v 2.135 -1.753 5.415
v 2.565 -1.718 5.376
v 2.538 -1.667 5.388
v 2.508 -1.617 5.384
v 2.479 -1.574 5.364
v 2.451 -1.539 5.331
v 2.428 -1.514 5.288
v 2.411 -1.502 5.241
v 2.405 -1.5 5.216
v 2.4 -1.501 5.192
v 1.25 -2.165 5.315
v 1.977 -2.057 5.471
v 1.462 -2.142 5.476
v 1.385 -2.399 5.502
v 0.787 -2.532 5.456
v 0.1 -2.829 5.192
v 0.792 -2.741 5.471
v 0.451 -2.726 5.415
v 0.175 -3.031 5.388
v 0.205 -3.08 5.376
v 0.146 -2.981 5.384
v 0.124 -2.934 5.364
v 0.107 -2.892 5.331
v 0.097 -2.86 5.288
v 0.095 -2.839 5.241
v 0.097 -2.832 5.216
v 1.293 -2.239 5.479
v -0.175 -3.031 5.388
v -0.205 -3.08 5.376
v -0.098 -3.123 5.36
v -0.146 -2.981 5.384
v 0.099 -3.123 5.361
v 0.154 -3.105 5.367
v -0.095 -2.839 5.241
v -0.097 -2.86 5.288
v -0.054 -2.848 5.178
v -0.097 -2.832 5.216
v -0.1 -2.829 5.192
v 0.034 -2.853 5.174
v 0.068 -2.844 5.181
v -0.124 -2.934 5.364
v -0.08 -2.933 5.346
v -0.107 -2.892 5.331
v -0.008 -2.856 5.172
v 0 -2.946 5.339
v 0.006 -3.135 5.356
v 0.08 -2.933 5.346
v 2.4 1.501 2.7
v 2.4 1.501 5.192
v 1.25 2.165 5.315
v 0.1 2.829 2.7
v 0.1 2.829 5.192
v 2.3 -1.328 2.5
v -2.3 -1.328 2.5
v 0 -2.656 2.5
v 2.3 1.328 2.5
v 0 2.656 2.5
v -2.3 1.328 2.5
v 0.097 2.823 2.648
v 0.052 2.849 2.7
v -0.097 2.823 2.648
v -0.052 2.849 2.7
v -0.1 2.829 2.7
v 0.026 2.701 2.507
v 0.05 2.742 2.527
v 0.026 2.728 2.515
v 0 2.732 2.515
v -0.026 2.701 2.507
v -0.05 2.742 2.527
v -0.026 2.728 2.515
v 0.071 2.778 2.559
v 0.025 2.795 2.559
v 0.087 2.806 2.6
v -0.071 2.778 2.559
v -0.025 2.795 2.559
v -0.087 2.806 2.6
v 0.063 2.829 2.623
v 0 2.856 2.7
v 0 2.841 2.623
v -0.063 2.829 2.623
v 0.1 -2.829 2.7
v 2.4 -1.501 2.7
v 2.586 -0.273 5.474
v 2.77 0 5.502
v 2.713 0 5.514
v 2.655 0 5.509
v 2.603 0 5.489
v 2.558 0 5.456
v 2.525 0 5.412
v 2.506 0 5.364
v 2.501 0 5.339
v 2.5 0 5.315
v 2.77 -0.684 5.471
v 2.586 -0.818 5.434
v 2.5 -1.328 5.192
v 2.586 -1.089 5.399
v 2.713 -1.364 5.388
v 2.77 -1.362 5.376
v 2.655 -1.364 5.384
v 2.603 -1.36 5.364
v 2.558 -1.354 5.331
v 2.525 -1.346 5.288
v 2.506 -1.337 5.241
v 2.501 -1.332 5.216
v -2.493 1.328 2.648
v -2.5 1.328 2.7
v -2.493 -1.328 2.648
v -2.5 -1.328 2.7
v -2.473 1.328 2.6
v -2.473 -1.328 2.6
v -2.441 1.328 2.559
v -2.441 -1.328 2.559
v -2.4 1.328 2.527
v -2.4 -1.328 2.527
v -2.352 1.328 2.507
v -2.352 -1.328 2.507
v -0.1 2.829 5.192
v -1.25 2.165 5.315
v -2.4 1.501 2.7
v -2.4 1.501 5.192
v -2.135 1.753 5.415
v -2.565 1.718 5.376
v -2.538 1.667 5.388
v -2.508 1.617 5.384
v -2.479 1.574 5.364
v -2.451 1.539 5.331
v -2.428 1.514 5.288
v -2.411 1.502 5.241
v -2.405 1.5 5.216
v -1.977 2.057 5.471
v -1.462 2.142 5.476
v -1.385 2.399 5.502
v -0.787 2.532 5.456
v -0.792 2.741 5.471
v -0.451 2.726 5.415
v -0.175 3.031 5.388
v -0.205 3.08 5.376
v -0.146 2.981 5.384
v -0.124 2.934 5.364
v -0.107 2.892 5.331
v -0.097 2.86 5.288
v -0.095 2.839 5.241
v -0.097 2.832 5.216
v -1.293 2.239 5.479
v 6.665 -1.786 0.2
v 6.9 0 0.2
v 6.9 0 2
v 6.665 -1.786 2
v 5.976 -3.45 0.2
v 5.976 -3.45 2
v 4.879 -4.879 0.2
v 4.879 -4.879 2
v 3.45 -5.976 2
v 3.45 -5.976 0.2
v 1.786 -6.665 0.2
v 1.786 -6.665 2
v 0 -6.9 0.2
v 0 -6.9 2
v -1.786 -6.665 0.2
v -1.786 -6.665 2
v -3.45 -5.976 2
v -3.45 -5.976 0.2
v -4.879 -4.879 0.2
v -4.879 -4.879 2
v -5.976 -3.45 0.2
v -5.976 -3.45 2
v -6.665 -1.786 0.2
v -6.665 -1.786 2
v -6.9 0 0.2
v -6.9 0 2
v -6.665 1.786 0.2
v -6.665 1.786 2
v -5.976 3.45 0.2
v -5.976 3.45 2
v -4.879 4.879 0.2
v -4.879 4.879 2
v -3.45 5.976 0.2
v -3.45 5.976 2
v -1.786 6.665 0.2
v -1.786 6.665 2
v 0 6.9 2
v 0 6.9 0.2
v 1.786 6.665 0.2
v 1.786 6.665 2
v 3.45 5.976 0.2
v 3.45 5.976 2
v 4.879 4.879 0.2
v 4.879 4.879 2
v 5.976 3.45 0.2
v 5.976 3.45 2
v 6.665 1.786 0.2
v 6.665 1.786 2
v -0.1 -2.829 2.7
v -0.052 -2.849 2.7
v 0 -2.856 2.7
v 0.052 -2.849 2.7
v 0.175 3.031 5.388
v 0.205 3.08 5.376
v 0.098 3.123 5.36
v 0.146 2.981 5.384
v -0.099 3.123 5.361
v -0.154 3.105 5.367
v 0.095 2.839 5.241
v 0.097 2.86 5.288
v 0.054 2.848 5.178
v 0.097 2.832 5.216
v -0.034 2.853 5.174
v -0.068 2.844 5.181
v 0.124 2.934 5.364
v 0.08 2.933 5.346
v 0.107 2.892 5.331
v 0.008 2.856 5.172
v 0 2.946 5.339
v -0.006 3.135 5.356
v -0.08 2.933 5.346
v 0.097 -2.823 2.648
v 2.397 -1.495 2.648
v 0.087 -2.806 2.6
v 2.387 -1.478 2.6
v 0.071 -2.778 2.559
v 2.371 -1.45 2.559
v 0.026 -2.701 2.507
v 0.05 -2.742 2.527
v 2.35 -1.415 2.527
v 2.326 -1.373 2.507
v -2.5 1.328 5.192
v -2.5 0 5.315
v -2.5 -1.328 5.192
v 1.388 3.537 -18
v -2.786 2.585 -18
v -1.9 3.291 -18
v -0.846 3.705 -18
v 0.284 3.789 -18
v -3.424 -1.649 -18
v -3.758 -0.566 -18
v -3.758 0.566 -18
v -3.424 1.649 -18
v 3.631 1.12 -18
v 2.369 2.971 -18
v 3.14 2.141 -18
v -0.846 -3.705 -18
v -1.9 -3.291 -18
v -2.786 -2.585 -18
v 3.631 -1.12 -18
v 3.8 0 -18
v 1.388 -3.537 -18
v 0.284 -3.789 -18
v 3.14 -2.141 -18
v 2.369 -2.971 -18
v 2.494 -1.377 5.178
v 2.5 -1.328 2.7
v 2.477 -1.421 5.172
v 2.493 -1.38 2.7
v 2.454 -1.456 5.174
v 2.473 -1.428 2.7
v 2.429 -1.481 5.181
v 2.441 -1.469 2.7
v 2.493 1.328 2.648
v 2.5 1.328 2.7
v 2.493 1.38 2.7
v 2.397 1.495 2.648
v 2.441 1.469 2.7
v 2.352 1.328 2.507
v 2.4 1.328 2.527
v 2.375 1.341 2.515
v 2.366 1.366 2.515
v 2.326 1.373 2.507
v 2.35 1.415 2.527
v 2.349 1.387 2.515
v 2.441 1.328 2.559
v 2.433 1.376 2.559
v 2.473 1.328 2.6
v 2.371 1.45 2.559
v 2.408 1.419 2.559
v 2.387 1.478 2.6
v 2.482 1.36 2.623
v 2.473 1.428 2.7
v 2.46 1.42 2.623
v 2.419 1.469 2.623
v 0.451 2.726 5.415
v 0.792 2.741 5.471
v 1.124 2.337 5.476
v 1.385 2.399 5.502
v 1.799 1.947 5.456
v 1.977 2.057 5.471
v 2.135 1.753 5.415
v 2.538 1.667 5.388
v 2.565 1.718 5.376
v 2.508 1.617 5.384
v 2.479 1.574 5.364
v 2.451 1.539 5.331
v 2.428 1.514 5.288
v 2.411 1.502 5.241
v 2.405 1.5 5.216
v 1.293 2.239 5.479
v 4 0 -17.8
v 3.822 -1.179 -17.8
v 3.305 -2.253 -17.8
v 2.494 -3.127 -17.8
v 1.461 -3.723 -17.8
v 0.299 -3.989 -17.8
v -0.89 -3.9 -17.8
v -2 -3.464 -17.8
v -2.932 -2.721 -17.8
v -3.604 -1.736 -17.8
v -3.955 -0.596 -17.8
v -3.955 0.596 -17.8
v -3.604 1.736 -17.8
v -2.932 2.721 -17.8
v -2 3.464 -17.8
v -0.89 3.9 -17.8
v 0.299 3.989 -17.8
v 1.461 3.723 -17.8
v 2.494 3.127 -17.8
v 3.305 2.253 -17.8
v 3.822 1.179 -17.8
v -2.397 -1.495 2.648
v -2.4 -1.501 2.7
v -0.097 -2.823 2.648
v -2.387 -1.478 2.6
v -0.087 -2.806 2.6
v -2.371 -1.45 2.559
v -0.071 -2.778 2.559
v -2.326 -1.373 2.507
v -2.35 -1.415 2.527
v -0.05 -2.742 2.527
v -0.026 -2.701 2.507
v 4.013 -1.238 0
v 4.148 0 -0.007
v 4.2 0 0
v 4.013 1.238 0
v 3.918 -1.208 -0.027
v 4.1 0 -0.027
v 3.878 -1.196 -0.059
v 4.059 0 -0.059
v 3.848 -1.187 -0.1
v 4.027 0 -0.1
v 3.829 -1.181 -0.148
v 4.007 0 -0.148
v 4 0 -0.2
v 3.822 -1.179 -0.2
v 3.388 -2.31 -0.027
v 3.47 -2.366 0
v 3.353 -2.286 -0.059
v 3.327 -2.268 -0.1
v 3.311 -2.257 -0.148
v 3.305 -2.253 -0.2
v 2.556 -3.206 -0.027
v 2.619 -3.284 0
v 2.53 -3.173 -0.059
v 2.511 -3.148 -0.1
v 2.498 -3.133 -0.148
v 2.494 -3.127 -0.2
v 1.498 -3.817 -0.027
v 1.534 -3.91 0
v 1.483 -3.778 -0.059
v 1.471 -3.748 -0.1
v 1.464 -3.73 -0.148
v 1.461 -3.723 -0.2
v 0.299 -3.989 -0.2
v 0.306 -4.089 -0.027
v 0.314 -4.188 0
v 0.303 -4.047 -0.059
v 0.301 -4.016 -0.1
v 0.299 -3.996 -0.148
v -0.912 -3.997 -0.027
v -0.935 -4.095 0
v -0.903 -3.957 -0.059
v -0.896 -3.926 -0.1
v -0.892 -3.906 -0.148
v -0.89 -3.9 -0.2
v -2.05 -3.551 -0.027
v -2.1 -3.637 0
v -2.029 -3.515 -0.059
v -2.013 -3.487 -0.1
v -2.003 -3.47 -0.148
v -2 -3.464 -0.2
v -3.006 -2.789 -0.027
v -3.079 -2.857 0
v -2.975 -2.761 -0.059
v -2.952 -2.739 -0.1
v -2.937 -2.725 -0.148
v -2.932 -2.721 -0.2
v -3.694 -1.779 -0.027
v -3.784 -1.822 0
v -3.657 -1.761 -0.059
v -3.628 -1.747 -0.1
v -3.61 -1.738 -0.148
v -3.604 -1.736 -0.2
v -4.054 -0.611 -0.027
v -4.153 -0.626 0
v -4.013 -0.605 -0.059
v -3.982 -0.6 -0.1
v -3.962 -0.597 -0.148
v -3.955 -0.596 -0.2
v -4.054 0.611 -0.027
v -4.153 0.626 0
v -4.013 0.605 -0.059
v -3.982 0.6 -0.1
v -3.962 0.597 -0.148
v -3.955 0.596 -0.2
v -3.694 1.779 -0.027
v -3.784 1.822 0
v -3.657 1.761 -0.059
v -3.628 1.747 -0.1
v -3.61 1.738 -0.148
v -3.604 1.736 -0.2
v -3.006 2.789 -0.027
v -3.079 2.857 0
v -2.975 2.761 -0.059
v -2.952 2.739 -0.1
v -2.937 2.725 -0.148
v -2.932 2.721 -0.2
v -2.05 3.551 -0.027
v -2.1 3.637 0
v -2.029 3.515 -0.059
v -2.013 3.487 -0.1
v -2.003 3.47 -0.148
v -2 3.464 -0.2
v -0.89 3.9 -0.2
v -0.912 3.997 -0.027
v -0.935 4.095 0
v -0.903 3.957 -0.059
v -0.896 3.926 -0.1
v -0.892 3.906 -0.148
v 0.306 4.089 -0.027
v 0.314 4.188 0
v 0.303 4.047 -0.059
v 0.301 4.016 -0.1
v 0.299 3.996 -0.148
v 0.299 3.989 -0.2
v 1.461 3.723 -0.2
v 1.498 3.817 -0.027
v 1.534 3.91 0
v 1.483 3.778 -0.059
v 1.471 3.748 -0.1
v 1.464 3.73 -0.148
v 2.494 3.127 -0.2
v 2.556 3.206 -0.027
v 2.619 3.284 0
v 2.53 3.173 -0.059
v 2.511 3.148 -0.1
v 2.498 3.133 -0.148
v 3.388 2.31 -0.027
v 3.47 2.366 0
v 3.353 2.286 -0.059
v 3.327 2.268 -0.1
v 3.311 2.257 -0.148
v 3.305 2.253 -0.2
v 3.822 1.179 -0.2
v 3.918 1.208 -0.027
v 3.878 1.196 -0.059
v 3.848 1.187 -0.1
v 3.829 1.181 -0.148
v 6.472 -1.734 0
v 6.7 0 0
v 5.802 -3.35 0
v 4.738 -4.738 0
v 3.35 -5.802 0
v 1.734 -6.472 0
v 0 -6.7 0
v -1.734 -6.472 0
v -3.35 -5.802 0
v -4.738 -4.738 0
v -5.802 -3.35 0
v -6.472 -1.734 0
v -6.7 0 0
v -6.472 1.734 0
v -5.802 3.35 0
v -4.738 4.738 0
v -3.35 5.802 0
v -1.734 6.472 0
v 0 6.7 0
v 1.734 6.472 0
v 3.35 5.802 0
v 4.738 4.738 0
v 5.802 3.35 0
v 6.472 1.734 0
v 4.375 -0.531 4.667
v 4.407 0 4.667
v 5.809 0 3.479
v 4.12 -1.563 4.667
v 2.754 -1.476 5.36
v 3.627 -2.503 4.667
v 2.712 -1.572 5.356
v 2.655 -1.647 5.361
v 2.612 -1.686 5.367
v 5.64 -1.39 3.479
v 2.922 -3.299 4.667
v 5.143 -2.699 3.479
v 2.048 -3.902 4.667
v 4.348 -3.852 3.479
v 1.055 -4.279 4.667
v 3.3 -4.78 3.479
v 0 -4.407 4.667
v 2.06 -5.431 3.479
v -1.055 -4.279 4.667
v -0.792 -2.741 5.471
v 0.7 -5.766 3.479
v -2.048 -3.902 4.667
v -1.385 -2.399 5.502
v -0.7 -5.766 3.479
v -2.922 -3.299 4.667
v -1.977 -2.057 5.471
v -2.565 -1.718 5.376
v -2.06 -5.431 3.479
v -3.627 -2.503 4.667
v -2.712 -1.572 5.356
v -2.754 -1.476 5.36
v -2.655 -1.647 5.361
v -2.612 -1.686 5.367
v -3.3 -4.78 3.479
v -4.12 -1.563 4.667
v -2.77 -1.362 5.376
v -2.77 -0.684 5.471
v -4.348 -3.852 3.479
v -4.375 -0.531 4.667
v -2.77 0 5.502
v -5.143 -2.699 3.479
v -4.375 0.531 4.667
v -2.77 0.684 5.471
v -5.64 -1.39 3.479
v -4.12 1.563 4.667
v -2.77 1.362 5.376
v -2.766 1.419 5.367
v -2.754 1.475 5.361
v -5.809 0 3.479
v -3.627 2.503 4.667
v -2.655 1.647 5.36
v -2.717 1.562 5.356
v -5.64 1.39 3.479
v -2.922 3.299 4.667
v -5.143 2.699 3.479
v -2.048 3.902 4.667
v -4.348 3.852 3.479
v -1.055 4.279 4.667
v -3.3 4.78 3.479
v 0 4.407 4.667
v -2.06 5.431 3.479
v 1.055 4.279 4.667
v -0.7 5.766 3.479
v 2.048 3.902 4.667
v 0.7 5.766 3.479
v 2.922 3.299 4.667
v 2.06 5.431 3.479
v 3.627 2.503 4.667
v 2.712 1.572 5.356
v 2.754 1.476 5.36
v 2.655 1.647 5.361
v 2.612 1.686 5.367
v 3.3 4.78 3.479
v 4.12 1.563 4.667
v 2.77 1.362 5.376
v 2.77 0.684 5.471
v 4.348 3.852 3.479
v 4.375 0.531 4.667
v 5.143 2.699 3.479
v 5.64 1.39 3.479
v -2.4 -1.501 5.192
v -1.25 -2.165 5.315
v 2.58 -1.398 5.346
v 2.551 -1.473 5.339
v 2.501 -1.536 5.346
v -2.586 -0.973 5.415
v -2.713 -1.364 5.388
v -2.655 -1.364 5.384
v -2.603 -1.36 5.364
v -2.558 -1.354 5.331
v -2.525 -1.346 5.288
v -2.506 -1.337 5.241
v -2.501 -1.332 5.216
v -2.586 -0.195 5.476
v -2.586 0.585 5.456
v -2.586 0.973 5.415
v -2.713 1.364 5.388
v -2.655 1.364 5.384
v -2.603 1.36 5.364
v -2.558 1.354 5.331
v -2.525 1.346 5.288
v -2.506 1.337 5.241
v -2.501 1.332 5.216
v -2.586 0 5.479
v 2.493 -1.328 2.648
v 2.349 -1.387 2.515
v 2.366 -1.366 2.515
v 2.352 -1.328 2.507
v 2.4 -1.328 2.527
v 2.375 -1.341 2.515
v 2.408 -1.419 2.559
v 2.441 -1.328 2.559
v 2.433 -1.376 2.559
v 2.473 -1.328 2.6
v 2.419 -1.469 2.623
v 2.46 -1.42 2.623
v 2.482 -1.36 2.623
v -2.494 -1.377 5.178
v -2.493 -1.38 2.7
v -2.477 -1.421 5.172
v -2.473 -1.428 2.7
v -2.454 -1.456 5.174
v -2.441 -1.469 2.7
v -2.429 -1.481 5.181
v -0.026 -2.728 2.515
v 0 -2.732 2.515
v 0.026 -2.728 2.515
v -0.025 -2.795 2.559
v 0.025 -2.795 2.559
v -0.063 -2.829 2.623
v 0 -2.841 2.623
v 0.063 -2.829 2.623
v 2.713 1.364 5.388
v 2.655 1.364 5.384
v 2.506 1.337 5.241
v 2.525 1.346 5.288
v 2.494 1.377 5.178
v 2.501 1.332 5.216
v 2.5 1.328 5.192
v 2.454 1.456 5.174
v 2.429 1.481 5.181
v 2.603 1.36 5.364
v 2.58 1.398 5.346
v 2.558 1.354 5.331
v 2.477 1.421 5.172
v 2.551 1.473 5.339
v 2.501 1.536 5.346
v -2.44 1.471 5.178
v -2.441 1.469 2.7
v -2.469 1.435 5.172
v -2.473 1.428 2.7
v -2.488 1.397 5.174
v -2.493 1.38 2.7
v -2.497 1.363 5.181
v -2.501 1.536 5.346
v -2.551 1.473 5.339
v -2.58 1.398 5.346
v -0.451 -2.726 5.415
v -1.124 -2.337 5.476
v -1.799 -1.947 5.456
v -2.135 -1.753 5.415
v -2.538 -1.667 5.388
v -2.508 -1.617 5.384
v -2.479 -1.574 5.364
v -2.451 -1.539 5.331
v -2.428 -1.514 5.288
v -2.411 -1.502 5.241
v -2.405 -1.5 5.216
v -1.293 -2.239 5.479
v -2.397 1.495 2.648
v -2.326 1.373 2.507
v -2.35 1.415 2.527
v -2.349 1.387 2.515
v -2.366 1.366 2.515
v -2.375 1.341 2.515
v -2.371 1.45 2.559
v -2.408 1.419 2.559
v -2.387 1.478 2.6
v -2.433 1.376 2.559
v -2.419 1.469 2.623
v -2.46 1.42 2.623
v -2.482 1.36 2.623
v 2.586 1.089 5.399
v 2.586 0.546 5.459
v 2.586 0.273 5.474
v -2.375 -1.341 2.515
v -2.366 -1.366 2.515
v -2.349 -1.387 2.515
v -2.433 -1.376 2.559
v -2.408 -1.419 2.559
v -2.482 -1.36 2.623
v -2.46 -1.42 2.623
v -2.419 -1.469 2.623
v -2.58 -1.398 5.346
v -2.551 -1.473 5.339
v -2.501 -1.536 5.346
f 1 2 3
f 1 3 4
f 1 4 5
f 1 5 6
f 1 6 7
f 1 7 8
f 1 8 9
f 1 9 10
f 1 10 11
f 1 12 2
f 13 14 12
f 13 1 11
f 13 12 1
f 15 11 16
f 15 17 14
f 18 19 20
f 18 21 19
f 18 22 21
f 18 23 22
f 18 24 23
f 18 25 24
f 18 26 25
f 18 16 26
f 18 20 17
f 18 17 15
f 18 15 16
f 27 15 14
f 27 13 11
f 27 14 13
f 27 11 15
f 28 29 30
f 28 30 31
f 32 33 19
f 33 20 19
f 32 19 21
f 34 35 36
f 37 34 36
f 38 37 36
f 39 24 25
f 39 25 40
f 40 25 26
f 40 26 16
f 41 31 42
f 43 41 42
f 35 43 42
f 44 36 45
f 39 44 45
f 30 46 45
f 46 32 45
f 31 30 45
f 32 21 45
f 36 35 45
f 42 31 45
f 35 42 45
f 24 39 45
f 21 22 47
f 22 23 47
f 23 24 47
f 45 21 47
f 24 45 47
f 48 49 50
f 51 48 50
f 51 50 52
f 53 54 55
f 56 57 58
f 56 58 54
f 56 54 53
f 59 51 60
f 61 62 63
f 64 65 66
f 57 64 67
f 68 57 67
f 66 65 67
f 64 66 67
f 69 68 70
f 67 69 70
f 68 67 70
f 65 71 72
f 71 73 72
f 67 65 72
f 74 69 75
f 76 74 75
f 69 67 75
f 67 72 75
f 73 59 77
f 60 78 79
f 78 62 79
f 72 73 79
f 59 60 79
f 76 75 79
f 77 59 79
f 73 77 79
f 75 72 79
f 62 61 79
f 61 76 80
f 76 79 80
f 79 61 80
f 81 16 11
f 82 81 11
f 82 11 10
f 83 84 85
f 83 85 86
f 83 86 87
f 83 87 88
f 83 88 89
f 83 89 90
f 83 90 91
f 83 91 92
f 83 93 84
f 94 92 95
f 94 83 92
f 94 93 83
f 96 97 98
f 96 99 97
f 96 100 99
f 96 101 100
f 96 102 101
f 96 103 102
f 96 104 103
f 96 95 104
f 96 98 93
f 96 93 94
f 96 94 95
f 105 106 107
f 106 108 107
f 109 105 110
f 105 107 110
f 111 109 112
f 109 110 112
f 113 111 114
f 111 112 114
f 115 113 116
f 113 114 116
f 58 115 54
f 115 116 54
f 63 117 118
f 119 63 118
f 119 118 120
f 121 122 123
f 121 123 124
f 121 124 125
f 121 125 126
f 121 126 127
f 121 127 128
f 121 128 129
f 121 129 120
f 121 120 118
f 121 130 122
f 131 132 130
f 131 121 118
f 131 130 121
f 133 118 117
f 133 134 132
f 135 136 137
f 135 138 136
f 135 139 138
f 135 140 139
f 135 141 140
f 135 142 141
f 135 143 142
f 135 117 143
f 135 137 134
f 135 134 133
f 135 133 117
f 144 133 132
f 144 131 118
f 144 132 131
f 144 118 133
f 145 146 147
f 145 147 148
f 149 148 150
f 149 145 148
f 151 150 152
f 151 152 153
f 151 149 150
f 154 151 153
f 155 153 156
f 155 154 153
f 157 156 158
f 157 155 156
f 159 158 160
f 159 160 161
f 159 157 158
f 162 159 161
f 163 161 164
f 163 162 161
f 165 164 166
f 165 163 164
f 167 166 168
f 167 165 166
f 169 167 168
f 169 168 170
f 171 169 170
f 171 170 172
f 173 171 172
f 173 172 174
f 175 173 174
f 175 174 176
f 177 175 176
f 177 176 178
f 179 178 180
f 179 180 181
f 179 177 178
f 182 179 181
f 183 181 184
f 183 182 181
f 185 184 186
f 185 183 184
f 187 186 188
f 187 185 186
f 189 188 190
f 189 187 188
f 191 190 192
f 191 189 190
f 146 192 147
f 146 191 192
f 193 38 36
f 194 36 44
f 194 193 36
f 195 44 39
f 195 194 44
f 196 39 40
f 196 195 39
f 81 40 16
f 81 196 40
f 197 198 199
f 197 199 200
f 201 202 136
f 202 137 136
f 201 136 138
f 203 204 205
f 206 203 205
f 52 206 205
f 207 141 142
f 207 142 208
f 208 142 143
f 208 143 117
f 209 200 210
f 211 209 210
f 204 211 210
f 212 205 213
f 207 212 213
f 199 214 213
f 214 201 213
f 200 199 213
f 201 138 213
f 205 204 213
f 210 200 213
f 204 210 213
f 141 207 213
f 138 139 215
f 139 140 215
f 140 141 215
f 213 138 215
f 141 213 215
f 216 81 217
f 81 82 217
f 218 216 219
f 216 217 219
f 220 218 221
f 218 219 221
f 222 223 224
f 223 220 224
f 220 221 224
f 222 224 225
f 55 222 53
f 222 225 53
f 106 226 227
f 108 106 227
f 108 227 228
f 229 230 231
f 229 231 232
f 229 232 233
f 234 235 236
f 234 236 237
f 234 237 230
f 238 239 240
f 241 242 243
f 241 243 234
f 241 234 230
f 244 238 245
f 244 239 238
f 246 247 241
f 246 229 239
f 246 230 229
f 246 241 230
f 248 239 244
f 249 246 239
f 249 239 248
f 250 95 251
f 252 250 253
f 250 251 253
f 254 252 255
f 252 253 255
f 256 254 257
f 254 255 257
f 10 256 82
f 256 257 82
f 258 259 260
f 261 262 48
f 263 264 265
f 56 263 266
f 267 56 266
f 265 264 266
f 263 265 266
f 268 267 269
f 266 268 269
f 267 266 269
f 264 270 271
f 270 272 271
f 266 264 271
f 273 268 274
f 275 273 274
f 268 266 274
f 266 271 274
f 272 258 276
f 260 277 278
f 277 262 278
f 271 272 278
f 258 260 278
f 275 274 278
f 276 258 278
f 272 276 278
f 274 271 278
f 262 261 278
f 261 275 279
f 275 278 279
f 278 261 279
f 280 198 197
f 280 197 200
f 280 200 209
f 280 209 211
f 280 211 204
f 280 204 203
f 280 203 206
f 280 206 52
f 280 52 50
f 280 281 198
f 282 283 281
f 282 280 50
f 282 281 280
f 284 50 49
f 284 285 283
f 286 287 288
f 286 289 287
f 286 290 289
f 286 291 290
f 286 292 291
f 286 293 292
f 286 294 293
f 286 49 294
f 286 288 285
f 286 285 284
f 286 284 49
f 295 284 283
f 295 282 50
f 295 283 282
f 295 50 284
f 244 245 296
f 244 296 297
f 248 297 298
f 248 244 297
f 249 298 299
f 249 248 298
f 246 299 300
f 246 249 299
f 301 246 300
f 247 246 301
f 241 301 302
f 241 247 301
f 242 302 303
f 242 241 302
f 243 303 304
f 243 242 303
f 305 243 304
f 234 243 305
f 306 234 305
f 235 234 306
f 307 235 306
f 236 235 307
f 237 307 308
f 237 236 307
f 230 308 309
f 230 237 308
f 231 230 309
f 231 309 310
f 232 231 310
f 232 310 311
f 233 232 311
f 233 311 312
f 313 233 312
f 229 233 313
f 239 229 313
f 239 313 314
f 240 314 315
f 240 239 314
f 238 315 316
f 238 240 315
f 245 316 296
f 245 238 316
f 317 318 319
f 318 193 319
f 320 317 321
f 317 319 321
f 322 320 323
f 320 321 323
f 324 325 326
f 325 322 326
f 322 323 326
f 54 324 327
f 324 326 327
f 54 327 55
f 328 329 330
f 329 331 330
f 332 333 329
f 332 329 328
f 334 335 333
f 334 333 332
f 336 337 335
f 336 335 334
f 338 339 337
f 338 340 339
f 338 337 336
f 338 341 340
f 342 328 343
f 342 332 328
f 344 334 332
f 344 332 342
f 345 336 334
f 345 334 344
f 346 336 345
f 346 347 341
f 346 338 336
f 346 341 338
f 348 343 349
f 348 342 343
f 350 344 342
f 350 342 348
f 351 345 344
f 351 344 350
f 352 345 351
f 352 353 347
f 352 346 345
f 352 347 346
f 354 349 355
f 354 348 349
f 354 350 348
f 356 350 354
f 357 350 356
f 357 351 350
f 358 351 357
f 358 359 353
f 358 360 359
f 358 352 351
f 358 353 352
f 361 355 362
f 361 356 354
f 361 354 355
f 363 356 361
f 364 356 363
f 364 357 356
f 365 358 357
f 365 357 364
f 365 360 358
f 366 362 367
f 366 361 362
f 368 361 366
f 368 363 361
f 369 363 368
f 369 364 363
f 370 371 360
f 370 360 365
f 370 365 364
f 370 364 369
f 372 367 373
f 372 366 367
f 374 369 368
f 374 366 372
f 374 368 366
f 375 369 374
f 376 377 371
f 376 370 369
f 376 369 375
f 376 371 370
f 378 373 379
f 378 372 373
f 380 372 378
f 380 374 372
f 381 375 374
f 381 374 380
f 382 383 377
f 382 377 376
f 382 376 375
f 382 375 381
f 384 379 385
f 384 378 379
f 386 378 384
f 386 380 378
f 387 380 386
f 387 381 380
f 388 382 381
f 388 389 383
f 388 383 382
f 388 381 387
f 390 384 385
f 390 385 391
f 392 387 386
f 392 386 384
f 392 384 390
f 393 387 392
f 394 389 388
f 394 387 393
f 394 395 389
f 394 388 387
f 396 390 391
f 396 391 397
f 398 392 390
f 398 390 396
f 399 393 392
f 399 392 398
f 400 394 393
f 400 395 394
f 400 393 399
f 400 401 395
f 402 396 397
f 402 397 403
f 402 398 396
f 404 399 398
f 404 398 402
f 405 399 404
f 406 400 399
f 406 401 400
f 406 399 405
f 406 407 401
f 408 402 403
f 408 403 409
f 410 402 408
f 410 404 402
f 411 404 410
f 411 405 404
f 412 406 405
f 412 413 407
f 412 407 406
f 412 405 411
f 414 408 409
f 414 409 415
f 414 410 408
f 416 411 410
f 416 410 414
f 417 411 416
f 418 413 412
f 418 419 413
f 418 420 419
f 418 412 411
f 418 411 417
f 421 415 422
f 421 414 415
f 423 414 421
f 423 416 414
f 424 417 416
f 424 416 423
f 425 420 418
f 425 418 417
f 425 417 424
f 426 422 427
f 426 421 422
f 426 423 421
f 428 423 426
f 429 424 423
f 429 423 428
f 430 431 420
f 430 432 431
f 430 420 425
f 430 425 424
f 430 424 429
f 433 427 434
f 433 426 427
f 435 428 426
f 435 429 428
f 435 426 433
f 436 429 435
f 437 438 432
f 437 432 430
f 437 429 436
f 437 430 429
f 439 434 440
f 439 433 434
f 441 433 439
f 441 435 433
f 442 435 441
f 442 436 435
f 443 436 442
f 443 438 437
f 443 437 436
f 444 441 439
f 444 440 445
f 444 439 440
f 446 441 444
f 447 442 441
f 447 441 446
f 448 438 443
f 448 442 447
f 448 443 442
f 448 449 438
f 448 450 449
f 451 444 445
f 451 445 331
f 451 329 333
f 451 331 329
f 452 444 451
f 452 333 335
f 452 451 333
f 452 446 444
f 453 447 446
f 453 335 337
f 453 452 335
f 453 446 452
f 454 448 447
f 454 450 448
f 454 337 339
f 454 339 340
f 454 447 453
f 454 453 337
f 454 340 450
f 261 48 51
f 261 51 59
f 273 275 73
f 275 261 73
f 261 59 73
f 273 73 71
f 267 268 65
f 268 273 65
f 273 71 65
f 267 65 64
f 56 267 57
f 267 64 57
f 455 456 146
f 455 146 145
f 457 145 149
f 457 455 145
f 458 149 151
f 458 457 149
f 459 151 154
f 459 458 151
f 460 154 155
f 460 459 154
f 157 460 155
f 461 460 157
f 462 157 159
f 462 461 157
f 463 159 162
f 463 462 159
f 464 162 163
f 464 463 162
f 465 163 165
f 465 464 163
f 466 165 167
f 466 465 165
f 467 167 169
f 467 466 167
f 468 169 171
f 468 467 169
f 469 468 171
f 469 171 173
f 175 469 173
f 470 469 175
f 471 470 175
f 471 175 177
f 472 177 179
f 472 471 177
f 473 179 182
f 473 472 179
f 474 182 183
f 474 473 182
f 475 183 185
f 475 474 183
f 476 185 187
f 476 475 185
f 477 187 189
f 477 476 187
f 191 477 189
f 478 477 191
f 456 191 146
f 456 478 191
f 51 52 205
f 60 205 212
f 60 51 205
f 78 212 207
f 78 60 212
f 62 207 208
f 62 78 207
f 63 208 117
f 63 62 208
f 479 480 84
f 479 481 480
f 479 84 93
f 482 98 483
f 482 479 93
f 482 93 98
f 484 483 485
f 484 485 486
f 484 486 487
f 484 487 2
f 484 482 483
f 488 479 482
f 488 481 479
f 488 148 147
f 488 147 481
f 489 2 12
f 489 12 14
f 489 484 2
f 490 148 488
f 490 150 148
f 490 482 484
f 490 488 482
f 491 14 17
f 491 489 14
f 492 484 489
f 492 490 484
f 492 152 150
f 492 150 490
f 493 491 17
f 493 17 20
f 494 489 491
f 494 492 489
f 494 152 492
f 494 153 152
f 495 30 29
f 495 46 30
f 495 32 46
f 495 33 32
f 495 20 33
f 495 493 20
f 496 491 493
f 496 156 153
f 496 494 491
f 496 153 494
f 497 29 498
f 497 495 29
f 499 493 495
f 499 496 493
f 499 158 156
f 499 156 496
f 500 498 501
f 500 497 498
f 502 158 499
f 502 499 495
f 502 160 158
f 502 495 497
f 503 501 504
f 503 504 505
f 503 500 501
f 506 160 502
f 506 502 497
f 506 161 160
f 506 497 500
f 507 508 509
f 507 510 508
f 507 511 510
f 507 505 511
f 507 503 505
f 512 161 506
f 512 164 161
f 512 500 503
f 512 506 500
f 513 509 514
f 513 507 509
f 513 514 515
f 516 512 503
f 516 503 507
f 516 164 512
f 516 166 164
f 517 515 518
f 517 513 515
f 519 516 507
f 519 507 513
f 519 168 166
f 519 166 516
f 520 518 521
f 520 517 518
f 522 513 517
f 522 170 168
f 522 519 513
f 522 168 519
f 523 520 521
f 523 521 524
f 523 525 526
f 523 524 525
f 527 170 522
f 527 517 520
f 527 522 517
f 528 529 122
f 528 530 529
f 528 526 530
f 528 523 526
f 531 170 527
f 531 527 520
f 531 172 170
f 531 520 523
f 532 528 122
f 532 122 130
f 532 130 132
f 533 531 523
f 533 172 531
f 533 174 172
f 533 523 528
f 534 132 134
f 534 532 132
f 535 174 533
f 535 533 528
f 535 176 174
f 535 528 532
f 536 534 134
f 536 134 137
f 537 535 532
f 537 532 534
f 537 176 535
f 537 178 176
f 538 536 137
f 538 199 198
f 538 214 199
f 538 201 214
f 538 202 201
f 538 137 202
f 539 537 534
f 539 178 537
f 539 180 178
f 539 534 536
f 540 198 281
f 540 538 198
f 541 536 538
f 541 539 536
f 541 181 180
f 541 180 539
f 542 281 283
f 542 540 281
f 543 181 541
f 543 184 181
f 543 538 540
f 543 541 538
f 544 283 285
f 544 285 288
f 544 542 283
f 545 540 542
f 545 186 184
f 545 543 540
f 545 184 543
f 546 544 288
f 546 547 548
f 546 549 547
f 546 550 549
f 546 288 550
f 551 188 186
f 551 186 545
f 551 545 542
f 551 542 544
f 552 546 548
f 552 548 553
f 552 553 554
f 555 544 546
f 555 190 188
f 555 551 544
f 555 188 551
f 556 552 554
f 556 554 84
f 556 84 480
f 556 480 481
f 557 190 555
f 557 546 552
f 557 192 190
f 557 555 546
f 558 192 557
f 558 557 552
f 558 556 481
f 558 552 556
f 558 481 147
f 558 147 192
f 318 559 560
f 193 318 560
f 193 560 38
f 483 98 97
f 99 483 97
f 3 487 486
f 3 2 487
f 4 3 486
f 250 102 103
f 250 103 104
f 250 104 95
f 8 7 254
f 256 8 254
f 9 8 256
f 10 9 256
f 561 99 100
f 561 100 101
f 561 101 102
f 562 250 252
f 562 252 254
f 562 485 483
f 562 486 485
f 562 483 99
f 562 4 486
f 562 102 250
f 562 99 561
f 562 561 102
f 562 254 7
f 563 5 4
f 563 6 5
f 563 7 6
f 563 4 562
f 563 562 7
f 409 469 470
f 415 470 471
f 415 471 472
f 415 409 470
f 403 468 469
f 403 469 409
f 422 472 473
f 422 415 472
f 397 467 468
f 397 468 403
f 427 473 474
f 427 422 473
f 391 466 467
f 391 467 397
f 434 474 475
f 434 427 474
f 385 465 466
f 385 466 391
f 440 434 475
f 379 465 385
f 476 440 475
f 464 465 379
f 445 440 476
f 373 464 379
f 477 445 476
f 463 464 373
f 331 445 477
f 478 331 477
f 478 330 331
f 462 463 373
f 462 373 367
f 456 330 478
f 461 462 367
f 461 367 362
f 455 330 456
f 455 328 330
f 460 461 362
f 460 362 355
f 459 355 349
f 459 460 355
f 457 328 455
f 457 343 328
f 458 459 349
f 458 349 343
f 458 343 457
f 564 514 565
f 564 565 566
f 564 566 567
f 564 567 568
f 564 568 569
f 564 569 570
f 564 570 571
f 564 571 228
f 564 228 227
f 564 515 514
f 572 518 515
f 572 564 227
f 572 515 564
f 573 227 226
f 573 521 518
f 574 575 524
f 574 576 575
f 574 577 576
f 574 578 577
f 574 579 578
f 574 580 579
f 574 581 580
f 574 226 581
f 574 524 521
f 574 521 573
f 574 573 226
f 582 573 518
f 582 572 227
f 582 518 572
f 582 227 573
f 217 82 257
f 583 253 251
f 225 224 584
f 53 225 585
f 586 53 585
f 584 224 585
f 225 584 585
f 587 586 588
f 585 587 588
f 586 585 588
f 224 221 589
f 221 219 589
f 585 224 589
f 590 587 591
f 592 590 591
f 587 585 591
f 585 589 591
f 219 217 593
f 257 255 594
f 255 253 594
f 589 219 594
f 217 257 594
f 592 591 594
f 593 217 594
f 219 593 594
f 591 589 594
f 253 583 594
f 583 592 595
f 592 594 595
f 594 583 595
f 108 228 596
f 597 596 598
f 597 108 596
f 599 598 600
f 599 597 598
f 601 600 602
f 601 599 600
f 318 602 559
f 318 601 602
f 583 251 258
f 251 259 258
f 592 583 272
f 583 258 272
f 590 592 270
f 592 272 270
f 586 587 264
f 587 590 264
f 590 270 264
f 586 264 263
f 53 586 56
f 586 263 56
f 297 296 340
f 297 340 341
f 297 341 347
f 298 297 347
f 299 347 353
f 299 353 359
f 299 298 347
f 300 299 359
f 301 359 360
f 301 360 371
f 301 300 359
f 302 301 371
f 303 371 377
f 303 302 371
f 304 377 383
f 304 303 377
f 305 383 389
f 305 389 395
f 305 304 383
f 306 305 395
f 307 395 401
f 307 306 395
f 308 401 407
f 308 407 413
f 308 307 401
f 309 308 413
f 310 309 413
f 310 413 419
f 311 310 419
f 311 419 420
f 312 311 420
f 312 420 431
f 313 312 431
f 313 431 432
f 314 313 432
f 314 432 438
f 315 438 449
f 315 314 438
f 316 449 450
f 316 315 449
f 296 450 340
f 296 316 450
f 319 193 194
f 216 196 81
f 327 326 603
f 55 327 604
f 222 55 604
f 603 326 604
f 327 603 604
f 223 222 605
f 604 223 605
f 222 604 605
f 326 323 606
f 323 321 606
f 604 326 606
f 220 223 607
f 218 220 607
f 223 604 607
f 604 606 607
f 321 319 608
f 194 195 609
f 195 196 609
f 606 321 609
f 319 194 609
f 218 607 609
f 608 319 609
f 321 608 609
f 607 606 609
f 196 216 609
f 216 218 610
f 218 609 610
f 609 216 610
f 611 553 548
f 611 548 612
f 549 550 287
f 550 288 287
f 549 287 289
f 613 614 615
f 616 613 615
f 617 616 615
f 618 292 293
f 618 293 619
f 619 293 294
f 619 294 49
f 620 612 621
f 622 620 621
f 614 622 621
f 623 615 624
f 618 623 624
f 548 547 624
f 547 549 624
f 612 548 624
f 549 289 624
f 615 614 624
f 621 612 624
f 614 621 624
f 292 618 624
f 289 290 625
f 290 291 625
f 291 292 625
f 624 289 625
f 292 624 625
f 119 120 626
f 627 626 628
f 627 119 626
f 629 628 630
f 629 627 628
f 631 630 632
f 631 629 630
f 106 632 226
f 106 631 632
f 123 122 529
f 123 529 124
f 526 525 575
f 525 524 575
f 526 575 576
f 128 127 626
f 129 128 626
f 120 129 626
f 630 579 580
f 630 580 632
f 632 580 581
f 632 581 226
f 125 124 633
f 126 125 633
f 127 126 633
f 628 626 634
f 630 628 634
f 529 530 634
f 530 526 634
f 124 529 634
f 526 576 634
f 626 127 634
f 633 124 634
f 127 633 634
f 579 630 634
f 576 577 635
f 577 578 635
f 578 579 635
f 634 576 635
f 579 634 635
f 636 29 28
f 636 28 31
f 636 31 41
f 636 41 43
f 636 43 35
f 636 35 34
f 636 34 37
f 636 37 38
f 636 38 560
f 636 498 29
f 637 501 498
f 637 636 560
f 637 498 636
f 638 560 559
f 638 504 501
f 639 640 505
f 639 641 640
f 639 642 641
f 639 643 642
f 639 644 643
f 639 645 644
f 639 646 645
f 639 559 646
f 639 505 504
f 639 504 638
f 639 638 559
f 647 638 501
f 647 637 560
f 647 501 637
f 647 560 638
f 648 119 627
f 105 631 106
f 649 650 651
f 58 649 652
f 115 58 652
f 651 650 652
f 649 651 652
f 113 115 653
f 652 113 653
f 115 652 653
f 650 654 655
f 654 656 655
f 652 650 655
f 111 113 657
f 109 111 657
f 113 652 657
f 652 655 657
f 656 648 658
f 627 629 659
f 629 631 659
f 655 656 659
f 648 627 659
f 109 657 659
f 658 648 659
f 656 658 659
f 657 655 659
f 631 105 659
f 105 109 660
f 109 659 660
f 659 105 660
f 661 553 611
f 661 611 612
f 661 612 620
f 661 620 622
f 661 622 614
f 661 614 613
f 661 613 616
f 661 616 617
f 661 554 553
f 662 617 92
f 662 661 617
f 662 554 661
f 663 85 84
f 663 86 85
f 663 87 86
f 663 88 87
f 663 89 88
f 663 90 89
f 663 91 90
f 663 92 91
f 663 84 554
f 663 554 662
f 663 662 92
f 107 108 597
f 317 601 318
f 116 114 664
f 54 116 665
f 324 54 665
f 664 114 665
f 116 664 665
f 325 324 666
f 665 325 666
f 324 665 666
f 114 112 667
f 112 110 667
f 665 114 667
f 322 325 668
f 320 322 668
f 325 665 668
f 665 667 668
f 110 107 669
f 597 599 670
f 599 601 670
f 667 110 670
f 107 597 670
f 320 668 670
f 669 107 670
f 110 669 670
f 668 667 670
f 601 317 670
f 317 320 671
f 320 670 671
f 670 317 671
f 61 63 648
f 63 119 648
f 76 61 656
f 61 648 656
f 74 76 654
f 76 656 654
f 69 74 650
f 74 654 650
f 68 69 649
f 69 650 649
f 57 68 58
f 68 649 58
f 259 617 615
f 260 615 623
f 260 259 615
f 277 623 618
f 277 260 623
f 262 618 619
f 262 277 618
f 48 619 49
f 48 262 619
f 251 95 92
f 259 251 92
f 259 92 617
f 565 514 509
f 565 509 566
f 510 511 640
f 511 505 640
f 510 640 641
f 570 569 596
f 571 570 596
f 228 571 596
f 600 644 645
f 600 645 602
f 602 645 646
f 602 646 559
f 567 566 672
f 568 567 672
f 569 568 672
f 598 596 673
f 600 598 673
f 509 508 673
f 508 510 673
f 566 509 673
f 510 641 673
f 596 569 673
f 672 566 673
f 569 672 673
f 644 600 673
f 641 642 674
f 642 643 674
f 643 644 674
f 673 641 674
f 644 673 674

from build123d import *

# Parameters (mm, degrees)
SCHNITT_LINEAR_AUSTRAGEN1_DEPTH = 3.5
FASE1_SIZE                      = 0.2
VERRUNDUNG1_R                   = 0.2


with BuildPart() as part:
    # Skizze1 → Rotation1 (revolve)
    with BuildSketch(Plane(origin=(0, 0, 0), x_dir=(0, 0, -1), z_dir=(1, 0, 0)), mode=Mode.PRIVATE) as rotation1_sk:
        with BuildLine():
            Line((-2, 6.9), (0, 6.9))
            Line((0, 6.9), (0, 4))
            Line((0, 4), (18, 4))
            Line((18, 4), (18, 0))
            Line((18, 0), (-6, 0))
            ThreePointArc((-6, 0), (-4.927694437, 3.987793876), (-2, 6.9))
        make_face()
    revolve(rotation1_sk.sketch.rotate(Axis((0, 0, 21.919879518), (0, 0, -1)), 90), axis=Axis((0, 0, 21.919879518), (0, 0, -1)))

    # Skizze2 → Schnitt-Linear austragen1 (cut)
    with BuildSketch(Plane.XY.offset(6)):
        Polygon((2.5, -1.443375673), (2.5, 1.443375673), (0, 2.886751346), (-2.5, 1.443375673), (-2.5, -1.443375673), (0, -2.886751346), align=None)
    extrude(amount=-SCHNITT_LINEAR_AUSTRAGEN1_DEPTH, mode=Mode.SUBTRACT)

    # Fase1
    fase1_edges = [part.edges().sort_by_distance(p)[0] for p in [
        (-6.9, 0, 0),
        (-4, 0, -18),
    ]]
    chamfer(fase1_edges, length=FASE1_SIZE)

    # Verrundung1
    verrundung1_edges = [part.edges().sort_by_distance(p)[0] for p in [
        (2.5, -0.725040561, 5.561851407),
        (1.25, 2.165063509, 5.596754807),
        (-1.25, 2.165063509, 5.596754807),
        (-2.5, 0, 5.596754807),
        (-1.25, -2.165063509, 5.596754807),
        (1.25, -2.165063509, 5.596754807),
        (2.5, -1.443375673, 3.978732003),
        (1.25, -2.165063509, 2.5),
        (0, -2.886751346, 3.978732003),
        (-1.25, -2.165063509, 2.5),
        (-2.5, -1.443375673, 3.978732003),
        (-2.5, 0, 2.5),
        (-2.5, 1.443375673, 3.978732003),
        (-1.25, 2.165063509, 2.5),
        (0, 2.886751346, 3.978732003),
        (1.25, 2.165063509, 2.5),
        (2.5, 1.443375673, 3.978732003),
        (2.5, 0, 2.5),
        (-4, 0, 0),
    ]]
    fillet(verrundung1_edges, radius=VERRUNDUNG1_R)


solid = part.part
